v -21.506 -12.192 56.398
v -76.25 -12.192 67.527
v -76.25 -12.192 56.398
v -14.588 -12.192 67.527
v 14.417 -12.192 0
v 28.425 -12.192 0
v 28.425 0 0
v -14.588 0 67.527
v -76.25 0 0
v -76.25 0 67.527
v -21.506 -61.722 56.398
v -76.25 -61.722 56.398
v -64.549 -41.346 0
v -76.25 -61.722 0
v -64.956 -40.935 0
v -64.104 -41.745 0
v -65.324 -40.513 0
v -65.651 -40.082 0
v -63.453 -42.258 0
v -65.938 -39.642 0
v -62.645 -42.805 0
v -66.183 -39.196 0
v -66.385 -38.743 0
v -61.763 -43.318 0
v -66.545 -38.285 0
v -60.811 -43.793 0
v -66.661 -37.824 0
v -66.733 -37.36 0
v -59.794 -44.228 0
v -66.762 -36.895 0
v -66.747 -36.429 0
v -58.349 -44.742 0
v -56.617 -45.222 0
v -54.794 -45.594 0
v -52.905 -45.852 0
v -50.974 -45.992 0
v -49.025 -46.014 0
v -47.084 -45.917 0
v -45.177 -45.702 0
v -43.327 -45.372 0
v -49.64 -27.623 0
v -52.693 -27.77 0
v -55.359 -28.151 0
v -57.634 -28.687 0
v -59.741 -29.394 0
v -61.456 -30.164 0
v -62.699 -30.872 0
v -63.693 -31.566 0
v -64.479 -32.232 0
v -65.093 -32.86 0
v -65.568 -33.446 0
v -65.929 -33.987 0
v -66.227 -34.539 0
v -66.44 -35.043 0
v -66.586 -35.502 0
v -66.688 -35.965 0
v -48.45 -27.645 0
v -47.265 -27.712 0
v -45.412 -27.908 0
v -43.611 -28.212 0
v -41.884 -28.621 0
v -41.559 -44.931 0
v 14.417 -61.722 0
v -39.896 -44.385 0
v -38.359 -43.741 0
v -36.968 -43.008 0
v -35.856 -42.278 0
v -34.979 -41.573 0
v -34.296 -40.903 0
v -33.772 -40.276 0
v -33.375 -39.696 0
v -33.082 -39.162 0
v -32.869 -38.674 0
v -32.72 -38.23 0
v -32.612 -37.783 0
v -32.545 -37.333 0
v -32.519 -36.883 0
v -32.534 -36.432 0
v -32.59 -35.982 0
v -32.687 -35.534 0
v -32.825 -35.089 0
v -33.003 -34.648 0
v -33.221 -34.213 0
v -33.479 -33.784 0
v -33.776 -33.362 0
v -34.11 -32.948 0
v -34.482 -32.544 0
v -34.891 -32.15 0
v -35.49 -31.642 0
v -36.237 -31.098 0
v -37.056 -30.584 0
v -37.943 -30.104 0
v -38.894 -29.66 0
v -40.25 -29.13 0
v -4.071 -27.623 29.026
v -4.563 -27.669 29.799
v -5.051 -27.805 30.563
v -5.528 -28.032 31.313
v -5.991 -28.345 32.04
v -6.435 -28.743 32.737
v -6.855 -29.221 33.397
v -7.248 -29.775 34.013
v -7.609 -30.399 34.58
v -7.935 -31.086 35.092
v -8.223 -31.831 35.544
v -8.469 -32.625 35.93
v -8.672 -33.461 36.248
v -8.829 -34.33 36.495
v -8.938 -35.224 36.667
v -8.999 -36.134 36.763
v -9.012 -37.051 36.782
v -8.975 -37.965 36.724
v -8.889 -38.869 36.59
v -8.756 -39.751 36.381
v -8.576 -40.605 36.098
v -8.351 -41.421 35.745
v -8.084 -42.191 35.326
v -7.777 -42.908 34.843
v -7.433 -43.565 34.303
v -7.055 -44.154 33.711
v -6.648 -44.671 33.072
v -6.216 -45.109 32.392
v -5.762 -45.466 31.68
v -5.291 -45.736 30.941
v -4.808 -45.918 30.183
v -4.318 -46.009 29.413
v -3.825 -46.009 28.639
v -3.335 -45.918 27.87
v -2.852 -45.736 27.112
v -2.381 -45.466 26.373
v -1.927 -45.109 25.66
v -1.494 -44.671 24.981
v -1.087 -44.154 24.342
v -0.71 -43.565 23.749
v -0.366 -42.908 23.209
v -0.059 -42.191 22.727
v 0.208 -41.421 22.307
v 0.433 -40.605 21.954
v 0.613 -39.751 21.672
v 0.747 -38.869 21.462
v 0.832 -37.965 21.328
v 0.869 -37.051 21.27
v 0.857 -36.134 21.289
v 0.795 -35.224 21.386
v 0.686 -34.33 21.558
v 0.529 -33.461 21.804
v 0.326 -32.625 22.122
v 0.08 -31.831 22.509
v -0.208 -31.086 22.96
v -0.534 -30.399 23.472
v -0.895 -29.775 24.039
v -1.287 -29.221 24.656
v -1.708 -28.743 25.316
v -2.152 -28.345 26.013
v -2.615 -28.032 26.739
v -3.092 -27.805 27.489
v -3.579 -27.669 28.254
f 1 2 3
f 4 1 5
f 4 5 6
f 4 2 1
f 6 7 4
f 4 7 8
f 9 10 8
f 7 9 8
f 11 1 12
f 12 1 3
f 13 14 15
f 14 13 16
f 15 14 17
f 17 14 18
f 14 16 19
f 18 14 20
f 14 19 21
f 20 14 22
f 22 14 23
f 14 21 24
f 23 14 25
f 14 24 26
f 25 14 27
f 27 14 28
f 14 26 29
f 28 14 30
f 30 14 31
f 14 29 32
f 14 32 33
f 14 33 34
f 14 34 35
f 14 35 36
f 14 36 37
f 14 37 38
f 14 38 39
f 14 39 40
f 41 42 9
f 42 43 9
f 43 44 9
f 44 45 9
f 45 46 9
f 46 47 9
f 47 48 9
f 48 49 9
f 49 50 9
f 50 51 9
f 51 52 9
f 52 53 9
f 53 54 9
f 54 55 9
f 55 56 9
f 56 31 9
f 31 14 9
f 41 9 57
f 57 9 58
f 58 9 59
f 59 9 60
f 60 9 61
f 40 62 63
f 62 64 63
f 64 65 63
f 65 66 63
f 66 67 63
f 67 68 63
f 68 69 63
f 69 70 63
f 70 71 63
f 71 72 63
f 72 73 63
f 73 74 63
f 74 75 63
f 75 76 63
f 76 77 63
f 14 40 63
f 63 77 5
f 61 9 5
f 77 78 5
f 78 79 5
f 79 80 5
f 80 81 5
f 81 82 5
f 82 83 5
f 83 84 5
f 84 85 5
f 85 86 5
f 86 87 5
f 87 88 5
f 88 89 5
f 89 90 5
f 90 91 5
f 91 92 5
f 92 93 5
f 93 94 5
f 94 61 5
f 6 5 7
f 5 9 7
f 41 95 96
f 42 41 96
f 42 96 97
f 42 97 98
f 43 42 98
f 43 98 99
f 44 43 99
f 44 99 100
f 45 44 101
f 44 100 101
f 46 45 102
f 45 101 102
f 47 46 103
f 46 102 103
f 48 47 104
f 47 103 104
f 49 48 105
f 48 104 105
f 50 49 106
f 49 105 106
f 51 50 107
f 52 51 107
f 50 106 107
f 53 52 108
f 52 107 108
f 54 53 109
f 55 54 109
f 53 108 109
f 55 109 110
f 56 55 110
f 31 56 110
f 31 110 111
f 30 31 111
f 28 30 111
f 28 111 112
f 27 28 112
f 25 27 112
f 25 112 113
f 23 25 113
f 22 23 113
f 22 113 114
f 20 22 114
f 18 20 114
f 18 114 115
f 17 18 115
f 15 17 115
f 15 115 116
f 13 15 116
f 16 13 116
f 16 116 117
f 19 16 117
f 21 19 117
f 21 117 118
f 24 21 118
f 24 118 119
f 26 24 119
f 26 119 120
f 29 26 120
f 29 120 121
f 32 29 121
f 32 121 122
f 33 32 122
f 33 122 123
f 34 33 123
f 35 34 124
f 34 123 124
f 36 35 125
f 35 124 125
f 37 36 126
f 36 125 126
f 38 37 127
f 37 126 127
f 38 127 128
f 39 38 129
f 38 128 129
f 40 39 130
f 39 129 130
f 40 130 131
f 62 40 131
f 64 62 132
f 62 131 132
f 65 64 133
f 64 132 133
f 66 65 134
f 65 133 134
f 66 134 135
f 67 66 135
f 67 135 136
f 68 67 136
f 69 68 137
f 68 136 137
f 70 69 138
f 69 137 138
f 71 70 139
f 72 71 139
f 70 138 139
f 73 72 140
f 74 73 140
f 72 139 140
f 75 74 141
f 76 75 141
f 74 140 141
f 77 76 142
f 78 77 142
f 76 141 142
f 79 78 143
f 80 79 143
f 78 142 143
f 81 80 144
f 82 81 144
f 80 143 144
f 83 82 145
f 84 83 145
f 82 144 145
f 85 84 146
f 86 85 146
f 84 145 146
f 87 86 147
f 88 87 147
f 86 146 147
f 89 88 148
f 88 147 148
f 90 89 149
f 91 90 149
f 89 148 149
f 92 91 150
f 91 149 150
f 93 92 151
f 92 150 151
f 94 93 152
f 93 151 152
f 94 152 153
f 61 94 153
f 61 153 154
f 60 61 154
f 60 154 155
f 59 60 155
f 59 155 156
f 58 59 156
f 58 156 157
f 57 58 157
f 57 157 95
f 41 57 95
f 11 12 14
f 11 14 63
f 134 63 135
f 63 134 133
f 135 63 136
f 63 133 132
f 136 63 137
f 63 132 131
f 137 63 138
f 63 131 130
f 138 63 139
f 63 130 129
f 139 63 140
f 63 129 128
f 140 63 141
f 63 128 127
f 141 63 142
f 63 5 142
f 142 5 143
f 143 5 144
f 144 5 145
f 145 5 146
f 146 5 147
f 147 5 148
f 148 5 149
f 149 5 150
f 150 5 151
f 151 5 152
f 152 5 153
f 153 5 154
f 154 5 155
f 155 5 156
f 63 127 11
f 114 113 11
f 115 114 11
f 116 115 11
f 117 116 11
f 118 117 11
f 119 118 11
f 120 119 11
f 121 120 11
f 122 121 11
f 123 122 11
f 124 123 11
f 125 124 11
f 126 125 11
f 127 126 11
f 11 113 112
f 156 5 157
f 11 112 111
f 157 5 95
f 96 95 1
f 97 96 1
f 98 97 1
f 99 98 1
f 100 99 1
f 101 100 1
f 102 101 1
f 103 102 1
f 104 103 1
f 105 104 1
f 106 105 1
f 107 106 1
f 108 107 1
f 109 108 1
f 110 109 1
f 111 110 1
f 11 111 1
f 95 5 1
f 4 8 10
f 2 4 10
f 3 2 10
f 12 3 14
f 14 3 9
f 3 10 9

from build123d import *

# Parameters (mm, degrees)
F1_DEPTH = 61.722
F2_DEPTH = 12.192
F3_R     = 9.1987347471
F4_DEPTH = 76.4727140636


with BuildPart() as f1:
    # F0 (on Front) → F1 (new body)
    with BuildSketch(Plane.XZ):
        Polygon((-21.5064492077, 56.3980266452), (-76.2501358986, 56.3980266452), (-76.2501358986, 0), (-21.5064492077, 0), (-14.5882889628, 0), (14.417463594, 0), align=None)
    extrude(amount=F1_DEPTH)

    # F0 (on Front) → F2 (join)
    with BuildSketch(Plane.XZ):
        Polygon((-14.5882889628, 67.5272345543), (-76.2501358986, 67.5272345543), (-76.2501358986, 56.3980266452), (-21.5064492077, 56.3980266452), (14.417463594, 0), (28.4246075898, 0), align=None)
        Polygon((-21.5064492077, 56.3980266452), (-76.2501358986, 56.3980266452), (-76.2501358986, 0), (-21.5064492077, 0), (-14.5882889628, 0), (14.417463594, 0), align=None)
    extrude(amount=F2_DEPTH)

    # F3 (on face) → F4 (cut, through all)
    with BuildSketch(Plane(origin=(10.2561951973, 0, 6.5328998878), x_dir=(0, 1, 0), z_dir=(0.8434293451, 0, 0.5372401137))):
        with Locations((-36.8216447532, 26.6688428819)):
            Circle(F3_R)
    extrude(amount=-F4_DEPTH, mode=Mode.SUBTRACT)


solid = f1.part
